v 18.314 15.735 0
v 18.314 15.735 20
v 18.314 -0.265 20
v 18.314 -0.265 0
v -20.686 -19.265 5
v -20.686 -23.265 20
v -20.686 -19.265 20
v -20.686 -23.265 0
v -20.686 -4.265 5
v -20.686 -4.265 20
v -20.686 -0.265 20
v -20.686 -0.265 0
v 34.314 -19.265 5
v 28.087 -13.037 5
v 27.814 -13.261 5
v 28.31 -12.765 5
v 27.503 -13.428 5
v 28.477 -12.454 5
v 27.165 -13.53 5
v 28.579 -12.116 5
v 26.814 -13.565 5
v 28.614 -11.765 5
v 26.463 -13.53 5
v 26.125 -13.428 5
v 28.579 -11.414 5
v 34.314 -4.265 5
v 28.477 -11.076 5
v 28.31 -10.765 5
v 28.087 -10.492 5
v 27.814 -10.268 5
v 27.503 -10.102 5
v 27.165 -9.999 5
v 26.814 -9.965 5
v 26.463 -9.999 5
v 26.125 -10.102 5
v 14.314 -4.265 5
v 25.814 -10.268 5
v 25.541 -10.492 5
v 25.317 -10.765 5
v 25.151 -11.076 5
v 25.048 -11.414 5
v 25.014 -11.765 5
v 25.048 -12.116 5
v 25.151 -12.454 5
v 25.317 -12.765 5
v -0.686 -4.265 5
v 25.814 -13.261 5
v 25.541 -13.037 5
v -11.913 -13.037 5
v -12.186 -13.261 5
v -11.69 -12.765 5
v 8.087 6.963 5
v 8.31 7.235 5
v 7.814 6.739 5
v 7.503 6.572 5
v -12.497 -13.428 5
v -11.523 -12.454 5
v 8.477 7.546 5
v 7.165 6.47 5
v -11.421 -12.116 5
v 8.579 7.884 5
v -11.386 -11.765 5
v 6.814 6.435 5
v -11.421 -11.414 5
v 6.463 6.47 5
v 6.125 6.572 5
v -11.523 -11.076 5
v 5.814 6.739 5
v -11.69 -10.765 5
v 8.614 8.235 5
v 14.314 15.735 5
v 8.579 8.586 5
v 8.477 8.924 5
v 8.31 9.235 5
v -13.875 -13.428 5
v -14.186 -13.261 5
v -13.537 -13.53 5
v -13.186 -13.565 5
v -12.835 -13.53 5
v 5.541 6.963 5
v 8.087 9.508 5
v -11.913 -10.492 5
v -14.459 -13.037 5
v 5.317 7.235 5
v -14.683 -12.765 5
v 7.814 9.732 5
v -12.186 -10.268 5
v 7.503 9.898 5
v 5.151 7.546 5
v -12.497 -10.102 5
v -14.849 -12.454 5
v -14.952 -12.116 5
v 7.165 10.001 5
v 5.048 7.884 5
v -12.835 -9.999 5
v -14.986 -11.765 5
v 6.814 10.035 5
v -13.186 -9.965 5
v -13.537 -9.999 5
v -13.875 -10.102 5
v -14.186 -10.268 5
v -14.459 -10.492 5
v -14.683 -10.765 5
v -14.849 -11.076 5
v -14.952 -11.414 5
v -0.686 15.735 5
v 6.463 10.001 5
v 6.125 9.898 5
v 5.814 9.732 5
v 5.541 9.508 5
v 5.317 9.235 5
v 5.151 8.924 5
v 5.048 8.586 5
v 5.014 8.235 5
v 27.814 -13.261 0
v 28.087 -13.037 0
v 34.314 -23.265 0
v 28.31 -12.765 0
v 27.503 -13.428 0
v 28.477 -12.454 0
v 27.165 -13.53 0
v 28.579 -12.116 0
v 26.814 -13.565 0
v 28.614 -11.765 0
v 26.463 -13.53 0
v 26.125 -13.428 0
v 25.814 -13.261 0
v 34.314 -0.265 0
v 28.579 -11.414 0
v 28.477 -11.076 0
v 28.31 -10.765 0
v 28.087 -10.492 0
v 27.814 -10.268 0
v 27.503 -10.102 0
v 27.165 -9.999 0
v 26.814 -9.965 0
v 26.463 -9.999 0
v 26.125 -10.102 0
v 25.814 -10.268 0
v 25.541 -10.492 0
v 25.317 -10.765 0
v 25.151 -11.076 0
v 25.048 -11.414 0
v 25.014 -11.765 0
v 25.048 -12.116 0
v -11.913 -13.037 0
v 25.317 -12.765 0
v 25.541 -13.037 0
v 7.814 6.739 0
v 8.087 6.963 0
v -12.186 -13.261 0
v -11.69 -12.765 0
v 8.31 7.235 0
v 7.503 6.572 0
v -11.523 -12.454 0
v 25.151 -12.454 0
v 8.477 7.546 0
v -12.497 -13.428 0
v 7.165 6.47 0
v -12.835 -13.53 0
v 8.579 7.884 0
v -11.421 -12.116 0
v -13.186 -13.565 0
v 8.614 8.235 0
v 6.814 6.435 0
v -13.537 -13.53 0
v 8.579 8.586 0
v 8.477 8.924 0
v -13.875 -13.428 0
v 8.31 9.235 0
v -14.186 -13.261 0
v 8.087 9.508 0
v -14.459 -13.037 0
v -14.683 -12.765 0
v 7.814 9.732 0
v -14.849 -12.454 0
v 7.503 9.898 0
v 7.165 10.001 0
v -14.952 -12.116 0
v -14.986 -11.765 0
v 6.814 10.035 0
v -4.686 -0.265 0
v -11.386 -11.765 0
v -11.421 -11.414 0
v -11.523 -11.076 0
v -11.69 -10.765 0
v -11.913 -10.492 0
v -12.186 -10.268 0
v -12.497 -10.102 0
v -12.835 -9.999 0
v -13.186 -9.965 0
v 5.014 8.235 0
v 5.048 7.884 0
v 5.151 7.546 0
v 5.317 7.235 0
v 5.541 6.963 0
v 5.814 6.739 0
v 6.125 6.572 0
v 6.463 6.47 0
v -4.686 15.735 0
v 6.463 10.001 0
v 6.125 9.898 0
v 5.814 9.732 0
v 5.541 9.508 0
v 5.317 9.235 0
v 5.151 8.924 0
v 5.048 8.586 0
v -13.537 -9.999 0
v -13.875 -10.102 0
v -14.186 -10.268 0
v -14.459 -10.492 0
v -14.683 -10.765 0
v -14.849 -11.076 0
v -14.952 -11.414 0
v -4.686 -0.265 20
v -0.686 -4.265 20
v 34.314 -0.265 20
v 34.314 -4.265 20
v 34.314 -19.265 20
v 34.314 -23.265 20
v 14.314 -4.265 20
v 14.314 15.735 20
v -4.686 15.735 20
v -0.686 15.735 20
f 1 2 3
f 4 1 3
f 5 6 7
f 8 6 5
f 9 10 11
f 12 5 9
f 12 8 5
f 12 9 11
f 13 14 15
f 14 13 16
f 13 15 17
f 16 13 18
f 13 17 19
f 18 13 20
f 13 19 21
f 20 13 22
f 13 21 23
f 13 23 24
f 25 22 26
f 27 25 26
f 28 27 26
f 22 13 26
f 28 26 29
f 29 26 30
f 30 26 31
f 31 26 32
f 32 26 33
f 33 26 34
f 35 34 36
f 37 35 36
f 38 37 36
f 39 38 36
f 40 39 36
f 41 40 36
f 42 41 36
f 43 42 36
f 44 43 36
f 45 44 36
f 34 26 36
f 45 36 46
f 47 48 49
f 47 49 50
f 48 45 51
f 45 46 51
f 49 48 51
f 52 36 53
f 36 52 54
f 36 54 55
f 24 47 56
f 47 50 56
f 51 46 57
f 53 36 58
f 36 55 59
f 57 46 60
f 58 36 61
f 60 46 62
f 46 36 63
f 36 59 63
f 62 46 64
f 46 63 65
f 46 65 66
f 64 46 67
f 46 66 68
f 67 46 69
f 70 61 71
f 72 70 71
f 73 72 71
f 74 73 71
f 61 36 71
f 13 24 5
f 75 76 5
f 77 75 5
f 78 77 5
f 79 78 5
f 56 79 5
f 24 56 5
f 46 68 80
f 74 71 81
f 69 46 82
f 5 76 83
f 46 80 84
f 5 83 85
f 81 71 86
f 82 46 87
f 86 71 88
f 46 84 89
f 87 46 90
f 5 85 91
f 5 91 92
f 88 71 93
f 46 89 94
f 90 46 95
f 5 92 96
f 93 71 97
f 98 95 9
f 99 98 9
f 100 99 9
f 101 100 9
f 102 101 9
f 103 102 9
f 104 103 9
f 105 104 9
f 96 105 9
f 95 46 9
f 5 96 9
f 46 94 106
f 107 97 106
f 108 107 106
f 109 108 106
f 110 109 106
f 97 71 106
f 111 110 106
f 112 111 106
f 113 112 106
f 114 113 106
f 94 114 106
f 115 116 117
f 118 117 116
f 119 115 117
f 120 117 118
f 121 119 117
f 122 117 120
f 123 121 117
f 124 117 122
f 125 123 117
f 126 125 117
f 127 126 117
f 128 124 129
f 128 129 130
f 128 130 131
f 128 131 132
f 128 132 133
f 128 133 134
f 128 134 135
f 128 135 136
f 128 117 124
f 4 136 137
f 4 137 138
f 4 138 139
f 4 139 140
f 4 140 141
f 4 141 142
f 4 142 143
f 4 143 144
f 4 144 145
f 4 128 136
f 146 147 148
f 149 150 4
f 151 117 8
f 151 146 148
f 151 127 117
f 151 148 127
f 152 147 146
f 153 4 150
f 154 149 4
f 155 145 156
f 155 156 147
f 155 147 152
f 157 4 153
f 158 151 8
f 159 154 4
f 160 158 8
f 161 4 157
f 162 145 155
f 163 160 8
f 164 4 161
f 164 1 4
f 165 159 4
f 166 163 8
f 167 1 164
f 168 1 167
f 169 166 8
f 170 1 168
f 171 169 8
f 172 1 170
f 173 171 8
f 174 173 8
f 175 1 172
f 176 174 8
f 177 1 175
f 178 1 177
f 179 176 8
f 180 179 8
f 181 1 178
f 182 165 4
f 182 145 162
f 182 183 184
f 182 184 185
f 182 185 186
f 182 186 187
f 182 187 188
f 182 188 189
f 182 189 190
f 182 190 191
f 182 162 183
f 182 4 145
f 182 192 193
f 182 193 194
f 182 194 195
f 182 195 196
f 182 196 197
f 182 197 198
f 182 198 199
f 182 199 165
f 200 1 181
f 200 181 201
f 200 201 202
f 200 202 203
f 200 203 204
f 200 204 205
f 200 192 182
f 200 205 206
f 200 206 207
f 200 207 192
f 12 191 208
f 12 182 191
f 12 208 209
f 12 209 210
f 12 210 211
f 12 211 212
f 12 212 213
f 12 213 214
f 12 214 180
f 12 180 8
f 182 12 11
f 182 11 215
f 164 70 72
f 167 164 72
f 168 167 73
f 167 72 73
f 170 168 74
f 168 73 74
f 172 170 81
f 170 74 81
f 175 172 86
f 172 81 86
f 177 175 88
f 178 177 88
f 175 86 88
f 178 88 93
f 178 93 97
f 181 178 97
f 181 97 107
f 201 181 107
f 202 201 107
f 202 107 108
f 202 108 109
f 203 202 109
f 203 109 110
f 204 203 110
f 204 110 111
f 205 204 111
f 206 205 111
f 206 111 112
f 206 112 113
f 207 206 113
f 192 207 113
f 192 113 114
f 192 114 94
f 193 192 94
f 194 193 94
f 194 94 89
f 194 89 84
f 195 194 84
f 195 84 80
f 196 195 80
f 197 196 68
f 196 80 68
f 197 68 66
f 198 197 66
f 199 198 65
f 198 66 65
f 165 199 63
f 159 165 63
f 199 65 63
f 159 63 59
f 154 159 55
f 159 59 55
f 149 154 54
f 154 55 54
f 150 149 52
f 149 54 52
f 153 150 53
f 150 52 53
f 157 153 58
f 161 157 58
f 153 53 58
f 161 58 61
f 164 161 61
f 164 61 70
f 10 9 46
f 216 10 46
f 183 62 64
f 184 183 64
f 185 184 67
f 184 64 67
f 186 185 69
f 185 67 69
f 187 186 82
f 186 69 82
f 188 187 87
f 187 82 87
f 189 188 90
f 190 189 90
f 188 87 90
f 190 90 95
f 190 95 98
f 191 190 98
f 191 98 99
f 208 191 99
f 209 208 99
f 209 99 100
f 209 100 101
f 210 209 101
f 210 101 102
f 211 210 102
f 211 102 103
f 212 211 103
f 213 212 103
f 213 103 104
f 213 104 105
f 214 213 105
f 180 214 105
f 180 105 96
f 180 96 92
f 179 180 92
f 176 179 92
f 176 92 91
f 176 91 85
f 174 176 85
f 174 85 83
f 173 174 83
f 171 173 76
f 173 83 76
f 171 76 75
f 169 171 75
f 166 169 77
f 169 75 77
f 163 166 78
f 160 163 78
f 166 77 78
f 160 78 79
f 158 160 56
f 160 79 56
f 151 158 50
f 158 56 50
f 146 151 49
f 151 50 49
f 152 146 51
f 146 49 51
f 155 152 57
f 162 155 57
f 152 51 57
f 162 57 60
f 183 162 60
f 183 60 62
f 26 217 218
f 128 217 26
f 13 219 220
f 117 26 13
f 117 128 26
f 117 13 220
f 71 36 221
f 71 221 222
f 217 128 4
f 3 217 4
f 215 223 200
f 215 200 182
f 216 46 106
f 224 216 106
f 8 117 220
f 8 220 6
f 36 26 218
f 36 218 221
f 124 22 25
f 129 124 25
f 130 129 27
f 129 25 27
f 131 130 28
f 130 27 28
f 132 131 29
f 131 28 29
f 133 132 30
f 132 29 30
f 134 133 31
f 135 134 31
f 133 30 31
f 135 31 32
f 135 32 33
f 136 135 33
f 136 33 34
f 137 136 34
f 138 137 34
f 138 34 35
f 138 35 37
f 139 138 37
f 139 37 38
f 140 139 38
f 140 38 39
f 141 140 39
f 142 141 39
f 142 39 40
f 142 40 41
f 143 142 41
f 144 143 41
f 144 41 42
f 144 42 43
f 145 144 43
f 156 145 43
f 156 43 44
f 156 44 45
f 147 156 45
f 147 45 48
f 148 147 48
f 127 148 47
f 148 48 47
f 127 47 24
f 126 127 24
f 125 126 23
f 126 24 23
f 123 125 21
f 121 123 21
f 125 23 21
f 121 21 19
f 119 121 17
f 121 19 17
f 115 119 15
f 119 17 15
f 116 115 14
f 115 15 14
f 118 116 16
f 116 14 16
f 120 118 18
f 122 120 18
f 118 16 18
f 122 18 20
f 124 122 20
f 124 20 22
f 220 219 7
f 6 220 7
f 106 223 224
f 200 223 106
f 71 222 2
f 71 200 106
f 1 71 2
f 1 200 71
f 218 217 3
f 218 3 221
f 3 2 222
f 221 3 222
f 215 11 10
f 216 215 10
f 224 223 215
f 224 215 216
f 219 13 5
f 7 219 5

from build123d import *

# Parameters (mm, degrees)
BOSS_EXTRUDE1_DEPTH = 5
BOSS_EXTRUDE2_DEPTH = 20
SKETCH4_W           = 55
SKETCH4_H           = 4
BOSS_EXTRUDE3_DEPTH = 20
SKETCH6_R           = 1.8
CUT_EXTRUDE3_DEPTH  = 6


with BuildPart() as part:
    # Sketch1 → Boss-Extrude1 (new body)
    with BuildSketch(Plane.XY):
        Polygon((14.31372549, -4.264705882), (34.31372549, -4.264705882), (34.31372549, -19.264705882), (-20.68627451, -19.264705882), (-20.68627451, -4.264705882), (-0.68627451, -4.264705882), (-0.68627451, 15.735294118), (14.31372549, 15.735294118), align=None)
    extrude(amount=BOSS_EXTRUDE1_DEPTH)

    # Sketch2 → Boss-Extrude2 (add)
    with BuildSketch(Plane(origin=(0, 0, 0), x_dir=(-1, 0, 0), z_dir=(0, 0, -1))):
        Polygon((0.68627451, 15.735294118), (4.68627451, 15.735294118), (4.68627451, -0.264705882), (6.079970528, -0.264705882), (20.68627451, -0.264705882), (20.68627451, -4.264705882), (0.68627451, -4.264705882), align=None)
    boss_extrude2 = extrude(amount=-BOSS_EXTRUDE2_DEPTH)

    # Sketch4 → Boss-Extrude3 (add)
    with BuildSketch(Plane(origin=(0, 0, 0), x_dir=(-1, 0, 0), z_dir=(0, 0, -1))):
        with Locations((-6.81372549, -21.264705882)):
            Rectangle(SKETCH4_W, SKETCH4_H)
    extrude(amount=-BOSS_EXTRUDE3_DEPTH)

    # Mirror1: Boss-Extrude2 across plane
    add(boss_extrude2.mirror(Plane.ZY.offset(-6.81372549)))

    # Sketch6 → Cut-Extrude3 (cut, through all)
    with BuildSketch(Plane.XY.offset(5)):
        with Locations((6.81372549, 8.235294118)):
            Circle(SKETCH6_R)
        with Locations((-13.18627451, -11.764705882)):
            Circle(SKETCH6_R)
        with Locations((26.81372549, -11.764705882)):
            Circle(SKETCH6_R)
    extrude(amount=-CUT_EXTRUDE3_DEPTH, mode=Mode.SUBTRACT)


solid = part.part
